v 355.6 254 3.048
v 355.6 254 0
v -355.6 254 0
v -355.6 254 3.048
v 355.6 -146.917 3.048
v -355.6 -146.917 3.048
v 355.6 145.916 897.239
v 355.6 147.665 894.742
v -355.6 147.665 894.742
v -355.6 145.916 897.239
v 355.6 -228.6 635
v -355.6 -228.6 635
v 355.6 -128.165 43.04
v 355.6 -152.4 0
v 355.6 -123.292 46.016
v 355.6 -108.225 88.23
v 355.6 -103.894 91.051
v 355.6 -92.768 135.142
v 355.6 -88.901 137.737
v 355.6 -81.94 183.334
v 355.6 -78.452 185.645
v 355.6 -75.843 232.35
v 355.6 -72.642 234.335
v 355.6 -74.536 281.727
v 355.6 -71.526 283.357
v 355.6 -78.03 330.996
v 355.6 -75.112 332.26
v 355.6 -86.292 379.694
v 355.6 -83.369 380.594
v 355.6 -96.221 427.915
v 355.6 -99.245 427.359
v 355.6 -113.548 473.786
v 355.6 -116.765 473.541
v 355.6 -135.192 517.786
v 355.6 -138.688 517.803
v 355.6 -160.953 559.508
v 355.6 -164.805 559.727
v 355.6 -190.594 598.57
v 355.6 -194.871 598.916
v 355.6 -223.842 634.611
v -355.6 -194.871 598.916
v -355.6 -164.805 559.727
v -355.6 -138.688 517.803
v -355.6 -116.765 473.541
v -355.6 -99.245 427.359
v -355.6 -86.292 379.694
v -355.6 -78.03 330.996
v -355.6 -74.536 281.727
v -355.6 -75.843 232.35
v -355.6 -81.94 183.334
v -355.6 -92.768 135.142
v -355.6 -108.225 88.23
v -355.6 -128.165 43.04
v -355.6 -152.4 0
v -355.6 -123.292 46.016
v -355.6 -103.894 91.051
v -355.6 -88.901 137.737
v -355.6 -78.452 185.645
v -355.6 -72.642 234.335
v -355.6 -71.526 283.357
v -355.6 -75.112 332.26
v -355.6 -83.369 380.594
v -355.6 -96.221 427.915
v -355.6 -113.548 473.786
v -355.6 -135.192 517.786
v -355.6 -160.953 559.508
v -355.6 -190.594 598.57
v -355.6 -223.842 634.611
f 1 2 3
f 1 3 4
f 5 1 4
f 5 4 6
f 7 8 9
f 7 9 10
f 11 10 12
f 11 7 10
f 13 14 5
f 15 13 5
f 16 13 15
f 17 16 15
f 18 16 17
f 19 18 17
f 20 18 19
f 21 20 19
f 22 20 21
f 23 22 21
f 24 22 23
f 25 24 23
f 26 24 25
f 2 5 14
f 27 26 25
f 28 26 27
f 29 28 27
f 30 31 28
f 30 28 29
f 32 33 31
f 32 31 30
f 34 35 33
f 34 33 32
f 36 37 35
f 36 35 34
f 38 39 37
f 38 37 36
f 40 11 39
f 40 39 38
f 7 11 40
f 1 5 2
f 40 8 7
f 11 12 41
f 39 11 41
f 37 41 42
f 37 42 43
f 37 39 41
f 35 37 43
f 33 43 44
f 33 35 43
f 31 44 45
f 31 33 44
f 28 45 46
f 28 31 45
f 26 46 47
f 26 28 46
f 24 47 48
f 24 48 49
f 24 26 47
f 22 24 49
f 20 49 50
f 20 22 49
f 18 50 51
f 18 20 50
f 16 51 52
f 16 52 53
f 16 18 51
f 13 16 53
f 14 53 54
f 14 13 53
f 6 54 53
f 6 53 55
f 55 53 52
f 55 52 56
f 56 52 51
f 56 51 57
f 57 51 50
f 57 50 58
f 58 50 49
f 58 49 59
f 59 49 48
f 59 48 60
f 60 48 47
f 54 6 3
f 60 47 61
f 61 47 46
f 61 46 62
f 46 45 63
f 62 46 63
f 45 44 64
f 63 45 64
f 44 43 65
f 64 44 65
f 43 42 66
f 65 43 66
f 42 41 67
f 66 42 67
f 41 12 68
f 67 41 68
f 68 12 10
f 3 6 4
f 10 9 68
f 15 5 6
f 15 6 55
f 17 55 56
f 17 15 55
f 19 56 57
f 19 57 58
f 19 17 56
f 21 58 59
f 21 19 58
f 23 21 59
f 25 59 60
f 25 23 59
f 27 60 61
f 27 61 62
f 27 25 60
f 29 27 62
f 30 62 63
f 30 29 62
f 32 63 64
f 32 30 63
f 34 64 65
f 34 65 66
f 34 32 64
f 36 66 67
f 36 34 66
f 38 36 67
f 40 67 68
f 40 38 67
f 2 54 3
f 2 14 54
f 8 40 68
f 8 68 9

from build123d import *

# Parameters (mm, degrees)
F1_DEPTH = 35.56
F2_SCALE = 10


with BuildPart() as f1:
    # F0 (on Right) → F1 (new body, symmetric)
    with BuildSketch(Plane.YZ):
        with BuildLine():
            Line((-15.24, 0), (25.4, 0))
            Line((25.4, 0), (25.4, 0.3048))
            Line((25.4, 0.3048), (-14.6917010188, 0.3048))
            ThreePointArc((-14.6917010188, 0.3048), (-7.5112329288, 33.2260010127), (-22.3841798034, 63.4610807938))
            Line((-22.3841798034, 63.4610807938), (14.7664575627, 89.4742371269))
            Line((14.7664575627, 89.4742371269), (14.5916314649, 89.72391467))
            Line((14.5916314649, 89.72391467), (-22.86, 63.5))
            ThreePointArc((-22.86, 63.5), (-7.8029756135, 33.0996429264), (-15.24, 0))
        make_face()
    extrude(amount=F1_DEPTH, both=True)


with BuildPart() as f1_1:
    # F2: moved
    add(f1.part.scale(F2_SCALE))


solid = f1_1.part
